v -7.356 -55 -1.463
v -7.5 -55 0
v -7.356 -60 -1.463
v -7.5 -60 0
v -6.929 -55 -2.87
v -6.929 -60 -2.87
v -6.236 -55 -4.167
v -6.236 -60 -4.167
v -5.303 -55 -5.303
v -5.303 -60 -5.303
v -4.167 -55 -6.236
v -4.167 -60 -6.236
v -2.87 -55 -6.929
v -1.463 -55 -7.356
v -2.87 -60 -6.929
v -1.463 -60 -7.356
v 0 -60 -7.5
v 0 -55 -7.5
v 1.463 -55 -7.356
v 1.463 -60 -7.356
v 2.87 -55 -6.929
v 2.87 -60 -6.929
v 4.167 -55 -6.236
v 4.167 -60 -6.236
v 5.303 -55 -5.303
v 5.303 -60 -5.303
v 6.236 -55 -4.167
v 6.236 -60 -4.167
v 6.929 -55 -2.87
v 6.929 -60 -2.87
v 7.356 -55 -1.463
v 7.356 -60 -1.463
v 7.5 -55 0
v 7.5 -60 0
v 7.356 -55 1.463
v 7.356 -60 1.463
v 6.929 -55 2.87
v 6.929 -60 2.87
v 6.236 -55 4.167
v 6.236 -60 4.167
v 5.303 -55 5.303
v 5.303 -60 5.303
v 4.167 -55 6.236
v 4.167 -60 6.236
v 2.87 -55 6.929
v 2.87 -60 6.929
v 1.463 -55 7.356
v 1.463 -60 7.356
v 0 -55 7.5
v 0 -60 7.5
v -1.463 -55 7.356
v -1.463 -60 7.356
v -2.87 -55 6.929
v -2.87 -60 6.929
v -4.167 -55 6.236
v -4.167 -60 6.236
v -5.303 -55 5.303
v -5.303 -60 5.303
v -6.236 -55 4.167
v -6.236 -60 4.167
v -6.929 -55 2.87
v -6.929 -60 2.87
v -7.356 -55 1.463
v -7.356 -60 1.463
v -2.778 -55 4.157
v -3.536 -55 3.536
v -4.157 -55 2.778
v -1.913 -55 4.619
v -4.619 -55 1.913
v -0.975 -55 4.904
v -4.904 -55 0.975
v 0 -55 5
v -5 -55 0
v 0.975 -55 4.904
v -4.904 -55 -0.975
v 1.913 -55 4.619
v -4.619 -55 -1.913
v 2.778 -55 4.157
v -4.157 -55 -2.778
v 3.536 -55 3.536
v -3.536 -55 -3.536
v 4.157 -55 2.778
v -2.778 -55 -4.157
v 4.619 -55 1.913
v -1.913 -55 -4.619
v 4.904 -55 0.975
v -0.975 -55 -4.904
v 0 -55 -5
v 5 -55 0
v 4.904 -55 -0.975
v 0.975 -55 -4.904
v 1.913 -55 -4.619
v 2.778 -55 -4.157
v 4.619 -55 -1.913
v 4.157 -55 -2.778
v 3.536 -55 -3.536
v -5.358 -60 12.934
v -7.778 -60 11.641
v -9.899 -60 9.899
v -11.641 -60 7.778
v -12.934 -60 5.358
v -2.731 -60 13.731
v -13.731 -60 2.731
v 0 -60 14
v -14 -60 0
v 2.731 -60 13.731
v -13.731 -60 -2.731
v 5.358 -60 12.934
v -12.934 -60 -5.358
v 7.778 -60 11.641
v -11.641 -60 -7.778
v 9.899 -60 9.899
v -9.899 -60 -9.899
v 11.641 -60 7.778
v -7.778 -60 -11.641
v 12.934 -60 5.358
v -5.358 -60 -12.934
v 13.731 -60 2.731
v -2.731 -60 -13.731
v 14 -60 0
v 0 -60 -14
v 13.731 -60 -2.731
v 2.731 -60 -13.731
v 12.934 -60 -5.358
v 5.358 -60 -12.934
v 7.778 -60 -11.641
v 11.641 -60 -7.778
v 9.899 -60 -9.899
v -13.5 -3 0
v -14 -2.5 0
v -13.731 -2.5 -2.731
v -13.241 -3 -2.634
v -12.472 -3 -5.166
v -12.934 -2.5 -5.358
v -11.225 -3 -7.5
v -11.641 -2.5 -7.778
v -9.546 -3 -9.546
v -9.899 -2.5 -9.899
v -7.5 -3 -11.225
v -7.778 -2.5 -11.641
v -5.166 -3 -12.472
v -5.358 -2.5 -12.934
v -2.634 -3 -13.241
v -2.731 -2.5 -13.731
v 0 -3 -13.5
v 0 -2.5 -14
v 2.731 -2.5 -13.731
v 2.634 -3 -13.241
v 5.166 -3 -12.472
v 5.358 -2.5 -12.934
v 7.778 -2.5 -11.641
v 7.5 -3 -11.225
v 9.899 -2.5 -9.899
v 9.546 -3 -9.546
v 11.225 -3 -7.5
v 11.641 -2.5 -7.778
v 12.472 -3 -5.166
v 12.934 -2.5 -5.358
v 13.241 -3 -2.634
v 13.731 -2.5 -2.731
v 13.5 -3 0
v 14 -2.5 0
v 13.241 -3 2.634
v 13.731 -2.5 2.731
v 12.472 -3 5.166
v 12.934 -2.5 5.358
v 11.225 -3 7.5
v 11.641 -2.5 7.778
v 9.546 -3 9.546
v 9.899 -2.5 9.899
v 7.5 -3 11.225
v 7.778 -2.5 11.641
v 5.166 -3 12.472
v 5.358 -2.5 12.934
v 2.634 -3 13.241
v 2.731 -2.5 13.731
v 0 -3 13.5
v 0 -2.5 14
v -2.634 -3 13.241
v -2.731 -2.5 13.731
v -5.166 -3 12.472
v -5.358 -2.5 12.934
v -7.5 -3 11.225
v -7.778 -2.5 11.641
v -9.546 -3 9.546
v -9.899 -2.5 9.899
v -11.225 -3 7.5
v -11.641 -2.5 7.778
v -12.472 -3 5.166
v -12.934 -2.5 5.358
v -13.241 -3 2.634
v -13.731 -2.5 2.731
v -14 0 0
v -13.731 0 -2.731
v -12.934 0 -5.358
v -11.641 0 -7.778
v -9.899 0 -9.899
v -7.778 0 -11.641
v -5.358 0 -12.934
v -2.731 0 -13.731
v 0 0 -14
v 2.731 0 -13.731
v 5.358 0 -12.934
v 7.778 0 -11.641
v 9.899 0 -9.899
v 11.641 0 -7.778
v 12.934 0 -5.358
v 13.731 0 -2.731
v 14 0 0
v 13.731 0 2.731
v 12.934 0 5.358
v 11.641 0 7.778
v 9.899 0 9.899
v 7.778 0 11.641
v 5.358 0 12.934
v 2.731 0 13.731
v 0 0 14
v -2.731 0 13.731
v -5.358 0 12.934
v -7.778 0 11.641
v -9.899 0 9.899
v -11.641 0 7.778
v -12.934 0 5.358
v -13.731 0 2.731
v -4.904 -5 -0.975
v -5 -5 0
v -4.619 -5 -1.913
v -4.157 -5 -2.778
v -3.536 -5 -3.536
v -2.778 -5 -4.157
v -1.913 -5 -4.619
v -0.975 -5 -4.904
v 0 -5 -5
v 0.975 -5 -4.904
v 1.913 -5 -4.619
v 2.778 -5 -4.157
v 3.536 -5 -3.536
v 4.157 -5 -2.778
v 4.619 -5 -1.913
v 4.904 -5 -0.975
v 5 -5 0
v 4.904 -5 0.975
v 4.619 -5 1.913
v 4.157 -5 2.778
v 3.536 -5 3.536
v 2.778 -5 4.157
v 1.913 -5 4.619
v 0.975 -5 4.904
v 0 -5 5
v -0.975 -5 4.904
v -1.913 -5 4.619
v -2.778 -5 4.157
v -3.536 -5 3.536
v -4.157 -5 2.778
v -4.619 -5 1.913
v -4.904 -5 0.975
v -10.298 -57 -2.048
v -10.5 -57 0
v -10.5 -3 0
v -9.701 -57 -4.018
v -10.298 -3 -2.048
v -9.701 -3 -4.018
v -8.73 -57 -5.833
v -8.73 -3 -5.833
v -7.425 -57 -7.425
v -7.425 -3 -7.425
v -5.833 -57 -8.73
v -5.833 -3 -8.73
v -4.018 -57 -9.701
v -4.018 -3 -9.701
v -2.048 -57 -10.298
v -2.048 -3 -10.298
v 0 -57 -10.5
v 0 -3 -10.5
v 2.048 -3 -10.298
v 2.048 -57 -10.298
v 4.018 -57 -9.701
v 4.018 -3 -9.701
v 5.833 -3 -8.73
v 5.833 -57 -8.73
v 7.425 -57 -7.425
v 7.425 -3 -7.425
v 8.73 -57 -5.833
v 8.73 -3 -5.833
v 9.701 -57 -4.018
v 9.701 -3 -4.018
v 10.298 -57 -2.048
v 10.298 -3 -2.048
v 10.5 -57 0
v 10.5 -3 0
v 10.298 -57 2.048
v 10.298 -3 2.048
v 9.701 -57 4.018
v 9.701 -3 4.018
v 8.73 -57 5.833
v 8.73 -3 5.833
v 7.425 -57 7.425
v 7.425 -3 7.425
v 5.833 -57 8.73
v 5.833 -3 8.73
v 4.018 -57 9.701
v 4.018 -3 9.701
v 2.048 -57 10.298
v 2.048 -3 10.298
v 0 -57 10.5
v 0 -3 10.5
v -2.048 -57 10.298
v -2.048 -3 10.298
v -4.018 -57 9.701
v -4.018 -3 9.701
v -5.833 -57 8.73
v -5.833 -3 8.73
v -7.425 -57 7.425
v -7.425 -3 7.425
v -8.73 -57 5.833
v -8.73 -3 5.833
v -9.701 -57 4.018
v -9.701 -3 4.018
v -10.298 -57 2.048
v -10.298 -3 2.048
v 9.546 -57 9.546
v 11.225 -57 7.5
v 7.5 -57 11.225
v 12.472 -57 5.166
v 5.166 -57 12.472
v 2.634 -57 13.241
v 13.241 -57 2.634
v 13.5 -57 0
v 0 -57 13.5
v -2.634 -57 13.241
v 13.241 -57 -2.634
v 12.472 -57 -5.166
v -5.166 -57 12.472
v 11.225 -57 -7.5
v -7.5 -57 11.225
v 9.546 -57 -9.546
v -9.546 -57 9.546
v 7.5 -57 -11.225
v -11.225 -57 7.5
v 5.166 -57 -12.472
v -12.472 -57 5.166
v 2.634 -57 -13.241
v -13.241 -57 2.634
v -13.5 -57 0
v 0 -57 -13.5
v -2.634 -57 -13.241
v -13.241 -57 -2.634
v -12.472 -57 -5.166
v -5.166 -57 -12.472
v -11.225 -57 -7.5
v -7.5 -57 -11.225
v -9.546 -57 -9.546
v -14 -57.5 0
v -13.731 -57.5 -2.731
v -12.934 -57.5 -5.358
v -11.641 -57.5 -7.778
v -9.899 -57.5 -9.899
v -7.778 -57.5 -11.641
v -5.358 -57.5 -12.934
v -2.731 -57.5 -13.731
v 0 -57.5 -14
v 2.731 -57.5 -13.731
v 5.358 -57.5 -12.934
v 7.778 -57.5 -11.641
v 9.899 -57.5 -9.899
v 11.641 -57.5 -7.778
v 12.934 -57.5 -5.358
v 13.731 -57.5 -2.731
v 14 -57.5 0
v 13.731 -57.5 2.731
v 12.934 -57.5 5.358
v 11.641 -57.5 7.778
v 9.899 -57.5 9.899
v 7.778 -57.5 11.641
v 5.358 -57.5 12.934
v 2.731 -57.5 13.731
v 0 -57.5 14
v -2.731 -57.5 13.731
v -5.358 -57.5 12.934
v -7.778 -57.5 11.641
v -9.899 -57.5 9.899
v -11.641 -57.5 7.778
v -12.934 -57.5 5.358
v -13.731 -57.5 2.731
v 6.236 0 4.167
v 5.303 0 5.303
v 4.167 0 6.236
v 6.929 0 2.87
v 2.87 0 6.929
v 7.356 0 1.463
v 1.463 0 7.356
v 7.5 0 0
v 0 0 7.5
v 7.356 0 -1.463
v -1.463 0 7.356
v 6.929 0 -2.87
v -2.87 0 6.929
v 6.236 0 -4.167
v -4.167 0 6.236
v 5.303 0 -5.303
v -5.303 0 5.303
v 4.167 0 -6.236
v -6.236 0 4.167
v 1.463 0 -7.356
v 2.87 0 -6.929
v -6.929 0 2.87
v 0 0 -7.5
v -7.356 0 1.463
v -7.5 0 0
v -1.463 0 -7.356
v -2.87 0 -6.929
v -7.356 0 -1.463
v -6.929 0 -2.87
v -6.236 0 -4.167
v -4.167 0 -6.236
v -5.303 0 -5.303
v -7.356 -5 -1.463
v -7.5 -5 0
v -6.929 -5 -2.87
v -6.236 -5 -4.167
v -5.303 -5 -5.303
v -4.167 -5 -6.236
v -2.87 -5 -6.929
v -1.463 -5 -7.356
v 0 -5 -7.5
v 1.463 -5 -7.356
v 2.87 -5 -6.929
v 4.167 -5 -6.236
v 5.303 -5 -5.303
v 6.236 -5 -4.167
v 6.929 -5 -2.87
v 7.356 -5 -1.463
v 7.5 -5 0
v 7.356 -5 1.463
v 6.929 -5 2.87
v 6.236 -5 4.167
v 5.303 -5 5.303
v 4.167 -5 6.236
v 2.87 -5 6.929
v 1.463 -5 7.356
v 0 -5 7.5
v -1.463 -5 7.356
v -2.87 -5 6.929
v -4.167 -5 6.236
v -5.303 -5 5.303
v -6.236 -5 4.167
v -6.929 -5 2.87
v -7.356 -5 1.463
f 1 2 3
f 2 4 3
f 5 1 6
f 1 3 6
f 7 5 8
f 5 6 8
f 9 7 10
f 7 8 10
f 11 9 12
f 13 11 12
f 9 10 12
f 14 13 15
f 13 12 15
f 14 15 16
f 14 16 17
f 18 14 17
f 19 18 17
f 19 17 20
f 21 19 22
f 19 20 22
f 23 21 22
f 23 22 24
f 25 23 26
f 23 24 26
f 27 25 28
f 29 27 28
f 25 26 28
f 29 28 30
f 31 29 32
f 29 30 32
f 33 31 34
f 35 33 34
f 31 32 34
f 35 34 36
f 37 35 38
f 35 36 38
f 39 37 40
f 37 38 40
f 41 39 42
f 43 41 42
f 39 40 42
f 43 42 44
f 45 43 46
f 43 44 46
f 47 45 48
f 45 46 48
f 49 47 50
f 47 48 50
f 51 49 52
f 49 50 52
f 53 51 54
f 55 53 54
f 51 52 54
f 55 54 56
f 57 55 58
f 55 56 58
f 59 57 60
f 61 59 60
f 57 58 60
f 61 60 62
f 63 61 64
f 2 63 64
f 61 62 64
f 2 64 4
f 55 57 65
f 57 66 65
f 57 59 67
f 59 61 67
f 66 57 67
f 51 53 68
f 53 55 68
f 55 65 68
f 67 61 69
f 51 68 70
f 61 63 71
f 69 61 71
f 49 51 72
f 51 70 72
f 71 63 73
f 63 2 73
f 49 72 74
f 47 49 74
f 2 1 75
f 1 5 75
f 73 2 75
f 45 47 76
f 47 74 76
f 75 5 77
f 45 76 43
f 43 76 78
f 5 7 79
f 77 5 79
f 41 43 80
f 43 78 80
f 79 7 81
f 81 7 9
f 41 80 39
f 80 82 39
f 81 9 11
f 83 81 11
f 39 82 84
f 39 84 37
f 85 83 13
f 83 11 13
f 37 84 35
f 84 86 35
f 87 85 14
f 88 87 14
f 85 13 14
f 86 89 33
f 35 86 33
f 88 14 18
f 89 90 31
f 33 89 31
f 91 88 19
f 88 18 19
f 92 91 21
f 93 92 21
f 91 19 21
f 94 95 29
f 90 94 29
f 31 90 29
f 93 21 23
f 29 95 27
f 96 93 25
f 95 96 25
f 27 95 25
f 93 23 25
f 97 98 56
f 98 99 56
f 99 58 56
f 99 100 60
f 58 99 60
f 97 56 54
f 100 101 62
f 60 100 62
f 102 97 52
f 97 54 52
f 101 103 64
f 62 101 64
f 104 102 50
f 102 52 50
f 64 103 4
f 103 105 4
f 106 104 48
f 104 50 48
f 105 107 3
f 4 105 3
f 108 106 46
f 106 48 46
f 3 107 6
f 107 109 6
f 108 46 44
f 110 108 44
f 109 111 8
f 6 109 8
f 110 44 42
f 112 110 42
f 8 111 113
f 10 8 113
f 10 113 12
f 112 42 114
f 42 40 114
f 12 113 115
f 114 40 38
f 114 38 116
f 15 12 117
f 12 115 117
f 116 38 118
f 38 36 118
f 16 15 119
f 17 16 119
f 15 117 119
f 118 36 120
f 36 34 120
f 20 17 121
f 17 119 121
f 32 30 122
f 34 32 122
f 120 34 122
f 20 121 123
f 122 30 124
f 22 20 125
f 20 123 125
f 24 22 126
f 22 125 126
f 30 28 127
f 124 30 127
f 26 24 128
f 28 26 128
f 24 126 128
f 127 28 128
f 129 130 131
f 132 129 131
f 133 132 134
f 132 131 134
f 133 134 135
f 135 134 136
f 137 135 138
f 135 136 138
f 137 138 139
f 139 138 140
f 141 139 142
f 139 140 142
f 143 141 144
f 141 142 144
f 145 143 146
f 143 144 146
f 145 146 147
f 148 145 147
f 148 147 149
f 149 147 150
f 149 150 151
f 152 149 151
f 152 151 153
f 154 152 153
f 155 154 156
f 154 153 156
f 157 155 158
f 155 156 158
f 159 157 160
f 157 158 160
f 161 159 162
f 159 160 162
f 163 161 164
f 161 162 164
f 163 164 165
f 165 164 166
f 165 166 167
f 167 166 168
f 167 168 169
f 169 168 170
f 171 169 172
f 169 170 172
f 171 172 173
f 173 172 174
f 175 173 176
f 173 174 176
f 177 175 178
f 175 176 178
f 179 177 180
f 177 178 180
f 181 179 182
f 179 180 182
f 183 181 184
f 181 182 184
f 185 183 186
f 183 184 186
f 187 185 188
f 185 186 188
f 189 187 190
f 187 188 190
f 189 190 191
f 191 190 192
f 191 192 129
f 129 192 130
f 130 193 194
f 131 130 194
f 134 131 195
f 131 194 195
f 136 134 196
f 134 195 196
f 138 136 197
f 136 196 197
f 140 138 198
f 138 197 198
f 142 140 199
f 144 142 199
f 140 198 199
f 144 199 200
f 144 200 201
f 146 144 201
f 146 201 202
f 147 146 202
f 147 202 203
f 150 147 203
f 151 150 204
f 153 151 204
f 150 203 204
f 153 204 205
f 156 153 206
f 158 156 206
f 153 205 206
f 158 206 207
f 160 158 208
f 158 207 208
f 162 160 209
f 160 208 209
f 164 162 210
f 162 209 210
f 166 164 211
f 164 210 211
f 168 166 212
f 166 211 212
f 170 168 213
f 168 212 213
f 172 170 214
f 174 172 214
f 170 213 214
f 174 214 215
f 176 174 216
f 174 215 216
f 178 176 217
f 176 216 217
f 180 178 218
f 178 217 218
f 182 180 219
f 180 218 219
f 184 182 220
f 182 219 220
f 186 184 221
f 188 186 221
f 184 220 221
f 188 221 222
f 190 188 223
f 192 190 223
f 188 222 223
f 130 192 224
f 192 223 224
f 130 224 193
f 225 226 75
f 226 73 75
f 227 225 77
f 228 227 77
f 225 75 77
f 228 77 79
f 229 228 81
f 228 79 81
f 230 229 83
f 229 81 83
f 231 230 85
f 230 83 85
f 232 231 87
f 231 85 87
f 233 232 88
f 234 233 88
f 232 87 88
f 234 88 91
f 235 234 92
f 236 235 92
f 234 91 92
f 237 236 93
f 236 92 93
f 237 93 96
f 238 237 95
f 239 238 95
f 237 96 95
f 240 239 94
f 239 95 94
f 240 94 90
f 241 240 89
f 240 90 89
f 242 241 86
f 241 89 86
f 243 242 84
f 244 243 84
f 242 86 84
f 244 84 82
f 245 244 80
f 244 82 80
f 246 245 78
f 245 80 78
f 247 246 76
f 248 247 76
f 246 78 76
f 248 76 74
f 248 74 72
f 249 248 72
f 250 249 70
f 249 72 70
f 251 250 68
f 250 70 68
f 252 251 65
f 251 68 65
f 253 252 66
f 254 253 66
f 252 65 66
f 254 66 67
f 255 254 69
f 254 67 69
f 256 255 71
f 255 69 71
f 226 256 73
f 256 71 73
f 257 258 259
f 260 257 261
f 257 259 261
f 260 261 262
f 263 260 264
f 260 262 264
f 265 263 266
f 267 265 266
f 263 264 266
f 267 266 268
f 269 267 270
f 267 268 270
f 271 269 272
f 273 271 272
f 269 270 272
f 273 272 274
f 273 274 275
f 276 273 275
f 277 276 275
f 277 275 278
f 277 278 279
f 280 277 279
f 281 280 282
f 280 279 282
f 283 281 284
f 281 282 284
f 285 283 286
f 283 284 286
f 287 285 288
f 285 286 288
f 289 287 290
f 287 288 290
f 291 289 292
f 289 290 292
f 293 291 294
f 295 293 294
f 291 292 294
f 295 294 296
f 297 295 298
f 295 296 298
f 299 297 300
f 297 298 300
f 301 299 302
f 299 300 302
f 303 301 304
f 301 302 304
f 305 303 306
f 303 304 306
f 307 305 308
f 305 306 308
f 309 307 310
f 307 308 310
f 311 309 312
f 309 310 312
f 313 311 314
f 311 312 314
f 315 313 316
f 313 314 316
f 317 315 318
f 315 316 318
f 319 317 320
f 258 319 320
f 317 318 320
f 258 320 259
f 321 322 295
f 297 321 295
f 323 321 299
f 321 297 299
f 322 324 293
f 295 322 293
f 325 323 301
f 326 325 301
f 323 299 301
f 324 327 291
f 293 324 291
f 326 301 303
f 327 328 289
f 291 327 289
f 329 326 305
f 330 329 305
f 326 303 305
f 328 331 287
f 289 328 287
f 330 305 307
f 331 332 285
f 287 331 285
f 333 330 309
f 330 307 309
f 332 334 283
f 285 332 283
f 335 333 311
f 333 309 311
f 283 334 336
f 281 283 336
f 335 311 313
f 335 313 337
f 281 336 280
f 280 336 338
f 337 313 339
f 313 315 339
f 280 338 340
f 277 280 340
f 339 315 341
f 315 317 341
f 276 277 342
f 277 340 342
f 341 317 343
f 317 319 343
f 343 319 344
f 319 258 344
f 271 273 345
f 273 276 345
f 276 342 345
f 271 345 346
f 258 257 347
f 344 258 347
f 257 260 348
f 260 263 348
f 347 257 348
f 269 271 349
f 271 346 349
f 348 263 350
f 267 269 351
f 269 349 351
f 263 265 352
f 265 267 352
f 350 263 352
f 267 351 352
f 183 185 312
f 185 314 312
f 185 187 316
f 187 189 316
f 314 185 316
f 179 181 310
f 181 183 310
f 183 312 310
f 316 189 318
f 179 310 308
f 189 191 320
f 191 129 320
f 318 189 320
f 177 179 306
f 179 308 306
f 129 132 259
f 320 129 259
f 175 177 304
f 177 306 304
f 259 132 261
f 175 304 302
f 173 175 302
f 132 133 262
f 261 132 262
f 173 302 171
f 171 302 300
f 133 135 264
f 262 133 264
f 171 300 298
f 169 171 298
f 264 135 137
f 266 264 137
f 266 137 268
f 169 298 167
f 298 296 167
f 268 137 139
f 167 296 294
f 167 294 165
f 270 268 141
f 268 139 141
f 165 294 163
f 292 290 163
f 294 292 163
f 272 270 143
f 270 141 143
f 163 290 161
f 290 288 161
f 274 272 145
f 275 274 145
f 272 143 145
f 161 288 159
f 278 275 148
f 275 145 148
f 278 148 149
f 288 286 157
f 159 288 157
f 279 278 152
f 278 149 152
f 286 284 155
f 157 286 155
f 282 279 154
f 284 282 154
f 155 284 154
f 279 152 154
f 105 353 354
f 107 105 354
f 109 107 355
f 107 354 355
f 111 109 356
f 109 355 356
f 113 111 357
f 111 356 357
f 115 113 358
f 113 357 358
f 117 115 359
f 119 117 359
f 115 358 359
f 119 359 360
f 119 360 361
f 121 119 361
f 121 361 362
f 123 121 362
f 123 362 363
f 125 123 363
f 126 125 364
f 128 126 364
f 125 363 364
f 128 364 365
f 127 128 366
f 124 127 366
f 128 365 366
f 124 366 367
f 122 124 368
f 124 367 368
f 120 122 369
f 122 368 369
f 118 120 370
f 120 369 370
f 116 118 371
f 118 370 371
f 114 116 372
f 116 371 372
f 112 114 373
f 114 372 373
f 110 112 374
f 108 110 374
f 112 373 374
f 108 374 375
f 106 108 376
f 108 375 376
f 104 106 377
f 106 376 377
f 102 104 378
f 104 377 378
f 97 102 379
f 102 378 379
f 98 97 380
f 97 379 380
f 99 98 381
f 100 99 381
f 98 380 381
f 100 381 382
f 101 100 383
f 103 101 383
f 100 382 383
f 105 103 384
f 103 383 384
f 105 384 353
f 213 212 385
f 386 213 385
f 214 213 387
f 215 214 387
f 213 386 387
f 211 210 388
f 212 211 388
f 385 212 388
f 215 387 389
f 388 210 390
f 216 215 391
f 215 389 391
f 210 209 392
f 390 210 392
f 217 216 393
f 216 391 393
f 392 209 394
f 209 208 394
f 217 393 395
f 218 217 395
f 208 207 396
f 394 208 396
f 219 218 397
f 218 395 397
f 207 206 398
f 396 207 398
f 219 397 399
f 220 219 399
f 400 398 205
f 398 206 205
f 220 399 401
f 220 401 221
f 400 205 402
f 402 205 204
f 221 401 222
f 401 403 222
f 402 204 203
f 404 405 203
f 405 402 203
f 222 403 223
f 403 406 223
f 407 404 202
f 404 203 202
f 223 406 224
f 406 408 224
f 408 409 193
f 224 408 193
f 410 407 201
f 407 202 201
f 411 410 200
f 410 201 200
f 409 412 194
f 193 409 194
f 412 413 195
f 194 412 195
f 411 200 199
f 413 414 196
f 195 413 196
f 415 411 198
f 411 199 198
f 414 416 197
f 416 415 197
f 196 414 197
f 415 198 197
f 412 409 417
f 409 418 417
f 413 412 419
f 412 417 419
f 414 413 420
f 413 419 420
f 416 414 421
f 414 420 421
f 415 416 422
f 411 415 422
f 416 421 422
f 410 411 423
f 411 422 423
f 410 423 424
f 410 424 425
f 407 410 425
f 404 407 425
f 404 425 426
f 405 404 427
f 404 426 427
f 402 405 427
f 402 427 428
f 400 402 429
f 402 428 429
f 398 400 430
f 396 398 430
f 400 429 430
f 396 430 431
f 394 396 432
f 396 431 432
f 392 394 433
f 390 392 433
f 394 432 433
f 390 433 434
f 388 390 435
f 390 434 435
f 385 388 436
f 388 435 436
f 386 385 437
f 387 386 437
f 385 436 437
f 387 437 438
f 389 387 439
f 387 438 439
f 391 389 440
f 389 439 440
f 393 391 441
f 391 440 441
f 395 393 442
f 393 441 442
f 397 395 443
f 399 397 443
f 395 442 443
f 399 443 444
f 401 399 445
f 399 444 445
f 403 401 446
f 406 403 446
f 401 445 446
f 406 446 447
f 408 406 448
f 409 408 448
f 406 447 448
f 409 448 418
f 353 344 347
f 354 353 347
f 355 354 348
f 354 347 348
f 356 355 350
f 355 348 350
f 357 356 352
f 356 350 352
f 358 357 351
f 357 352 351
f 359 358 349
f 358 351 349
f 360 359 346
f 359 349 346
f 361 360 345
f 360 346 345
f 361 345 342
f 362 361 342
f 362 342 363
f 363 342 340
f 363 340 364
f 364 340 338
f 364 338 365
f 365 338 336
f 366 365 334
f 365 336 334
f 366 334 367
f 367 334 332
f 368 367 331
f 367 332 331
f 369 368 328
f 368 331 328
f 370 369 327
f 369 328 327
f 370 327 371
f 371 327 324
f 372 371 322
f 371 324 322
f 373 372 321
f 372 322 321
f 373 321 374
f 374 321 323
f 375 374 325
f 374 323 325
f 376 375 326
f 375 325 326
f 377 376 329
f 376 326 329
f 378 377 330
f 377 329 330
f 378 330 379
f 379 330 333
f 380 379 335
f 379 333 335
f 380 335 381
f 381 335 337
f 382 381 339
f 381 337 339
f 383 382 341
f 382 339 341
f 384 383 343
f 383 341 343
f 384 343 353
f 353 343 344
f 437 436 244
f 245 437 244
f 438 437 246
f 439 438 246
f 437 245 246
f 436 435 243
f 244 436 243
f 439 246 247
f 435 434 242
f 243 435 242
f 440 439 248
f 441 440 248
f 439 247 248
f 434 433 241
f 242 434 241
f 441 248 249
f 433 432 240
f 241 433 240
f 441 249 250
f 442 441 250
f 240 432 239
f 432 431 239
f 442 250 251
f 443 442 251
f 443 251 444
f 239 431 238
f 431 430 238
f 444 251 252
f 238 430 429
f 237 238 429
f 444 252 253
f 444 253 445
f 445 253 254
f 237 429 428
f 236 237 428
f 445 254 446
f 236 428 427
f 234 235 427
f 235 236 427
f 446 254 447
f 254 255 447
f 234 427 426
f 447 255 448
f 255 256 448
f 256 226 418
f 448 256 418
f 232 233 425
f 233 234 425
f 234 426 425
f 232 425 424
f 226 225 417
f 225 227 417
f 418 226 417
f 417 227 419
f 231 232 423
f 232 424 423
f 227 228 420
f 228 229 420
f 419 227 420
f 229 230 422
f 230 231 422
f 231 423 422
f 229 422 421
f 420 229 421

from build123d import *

# Parameters (mm, degrees)
CHAMFER_1_SIZE = 0.5


with BuildPart() as part:
    # 草图1 → 旋转1 (revolve)
    with BuildSketch(Plane.XY, mode=Mode.PRIVATE) as revolve_1_sk:
        Polygon((7.5, -55), (7.5, -60), (14, -60), (14, -57), (10.5, -57), (10.5, -3), (14, -3), (14, 0), (7.5, 0), (7.5, -5), (5, -5), (5, -55), align=None)
    revolve(revolve_1_sk.sketch.rotate(Axis((0, 0, 0), (0, -1, 0)), 180), axis=Axis((0, 0, 0), (0, -1, 0)))

    # 倒角1
    chamfer_1_edges = [part.edges().sort_by_distance(p)[0] for p in [
        (14, -3, 0),
        (14, -57, 0),
    ]]
    chamfer(chamfer_1_edges, length=CHAMFER_1_SIZE)


solid = part.part
